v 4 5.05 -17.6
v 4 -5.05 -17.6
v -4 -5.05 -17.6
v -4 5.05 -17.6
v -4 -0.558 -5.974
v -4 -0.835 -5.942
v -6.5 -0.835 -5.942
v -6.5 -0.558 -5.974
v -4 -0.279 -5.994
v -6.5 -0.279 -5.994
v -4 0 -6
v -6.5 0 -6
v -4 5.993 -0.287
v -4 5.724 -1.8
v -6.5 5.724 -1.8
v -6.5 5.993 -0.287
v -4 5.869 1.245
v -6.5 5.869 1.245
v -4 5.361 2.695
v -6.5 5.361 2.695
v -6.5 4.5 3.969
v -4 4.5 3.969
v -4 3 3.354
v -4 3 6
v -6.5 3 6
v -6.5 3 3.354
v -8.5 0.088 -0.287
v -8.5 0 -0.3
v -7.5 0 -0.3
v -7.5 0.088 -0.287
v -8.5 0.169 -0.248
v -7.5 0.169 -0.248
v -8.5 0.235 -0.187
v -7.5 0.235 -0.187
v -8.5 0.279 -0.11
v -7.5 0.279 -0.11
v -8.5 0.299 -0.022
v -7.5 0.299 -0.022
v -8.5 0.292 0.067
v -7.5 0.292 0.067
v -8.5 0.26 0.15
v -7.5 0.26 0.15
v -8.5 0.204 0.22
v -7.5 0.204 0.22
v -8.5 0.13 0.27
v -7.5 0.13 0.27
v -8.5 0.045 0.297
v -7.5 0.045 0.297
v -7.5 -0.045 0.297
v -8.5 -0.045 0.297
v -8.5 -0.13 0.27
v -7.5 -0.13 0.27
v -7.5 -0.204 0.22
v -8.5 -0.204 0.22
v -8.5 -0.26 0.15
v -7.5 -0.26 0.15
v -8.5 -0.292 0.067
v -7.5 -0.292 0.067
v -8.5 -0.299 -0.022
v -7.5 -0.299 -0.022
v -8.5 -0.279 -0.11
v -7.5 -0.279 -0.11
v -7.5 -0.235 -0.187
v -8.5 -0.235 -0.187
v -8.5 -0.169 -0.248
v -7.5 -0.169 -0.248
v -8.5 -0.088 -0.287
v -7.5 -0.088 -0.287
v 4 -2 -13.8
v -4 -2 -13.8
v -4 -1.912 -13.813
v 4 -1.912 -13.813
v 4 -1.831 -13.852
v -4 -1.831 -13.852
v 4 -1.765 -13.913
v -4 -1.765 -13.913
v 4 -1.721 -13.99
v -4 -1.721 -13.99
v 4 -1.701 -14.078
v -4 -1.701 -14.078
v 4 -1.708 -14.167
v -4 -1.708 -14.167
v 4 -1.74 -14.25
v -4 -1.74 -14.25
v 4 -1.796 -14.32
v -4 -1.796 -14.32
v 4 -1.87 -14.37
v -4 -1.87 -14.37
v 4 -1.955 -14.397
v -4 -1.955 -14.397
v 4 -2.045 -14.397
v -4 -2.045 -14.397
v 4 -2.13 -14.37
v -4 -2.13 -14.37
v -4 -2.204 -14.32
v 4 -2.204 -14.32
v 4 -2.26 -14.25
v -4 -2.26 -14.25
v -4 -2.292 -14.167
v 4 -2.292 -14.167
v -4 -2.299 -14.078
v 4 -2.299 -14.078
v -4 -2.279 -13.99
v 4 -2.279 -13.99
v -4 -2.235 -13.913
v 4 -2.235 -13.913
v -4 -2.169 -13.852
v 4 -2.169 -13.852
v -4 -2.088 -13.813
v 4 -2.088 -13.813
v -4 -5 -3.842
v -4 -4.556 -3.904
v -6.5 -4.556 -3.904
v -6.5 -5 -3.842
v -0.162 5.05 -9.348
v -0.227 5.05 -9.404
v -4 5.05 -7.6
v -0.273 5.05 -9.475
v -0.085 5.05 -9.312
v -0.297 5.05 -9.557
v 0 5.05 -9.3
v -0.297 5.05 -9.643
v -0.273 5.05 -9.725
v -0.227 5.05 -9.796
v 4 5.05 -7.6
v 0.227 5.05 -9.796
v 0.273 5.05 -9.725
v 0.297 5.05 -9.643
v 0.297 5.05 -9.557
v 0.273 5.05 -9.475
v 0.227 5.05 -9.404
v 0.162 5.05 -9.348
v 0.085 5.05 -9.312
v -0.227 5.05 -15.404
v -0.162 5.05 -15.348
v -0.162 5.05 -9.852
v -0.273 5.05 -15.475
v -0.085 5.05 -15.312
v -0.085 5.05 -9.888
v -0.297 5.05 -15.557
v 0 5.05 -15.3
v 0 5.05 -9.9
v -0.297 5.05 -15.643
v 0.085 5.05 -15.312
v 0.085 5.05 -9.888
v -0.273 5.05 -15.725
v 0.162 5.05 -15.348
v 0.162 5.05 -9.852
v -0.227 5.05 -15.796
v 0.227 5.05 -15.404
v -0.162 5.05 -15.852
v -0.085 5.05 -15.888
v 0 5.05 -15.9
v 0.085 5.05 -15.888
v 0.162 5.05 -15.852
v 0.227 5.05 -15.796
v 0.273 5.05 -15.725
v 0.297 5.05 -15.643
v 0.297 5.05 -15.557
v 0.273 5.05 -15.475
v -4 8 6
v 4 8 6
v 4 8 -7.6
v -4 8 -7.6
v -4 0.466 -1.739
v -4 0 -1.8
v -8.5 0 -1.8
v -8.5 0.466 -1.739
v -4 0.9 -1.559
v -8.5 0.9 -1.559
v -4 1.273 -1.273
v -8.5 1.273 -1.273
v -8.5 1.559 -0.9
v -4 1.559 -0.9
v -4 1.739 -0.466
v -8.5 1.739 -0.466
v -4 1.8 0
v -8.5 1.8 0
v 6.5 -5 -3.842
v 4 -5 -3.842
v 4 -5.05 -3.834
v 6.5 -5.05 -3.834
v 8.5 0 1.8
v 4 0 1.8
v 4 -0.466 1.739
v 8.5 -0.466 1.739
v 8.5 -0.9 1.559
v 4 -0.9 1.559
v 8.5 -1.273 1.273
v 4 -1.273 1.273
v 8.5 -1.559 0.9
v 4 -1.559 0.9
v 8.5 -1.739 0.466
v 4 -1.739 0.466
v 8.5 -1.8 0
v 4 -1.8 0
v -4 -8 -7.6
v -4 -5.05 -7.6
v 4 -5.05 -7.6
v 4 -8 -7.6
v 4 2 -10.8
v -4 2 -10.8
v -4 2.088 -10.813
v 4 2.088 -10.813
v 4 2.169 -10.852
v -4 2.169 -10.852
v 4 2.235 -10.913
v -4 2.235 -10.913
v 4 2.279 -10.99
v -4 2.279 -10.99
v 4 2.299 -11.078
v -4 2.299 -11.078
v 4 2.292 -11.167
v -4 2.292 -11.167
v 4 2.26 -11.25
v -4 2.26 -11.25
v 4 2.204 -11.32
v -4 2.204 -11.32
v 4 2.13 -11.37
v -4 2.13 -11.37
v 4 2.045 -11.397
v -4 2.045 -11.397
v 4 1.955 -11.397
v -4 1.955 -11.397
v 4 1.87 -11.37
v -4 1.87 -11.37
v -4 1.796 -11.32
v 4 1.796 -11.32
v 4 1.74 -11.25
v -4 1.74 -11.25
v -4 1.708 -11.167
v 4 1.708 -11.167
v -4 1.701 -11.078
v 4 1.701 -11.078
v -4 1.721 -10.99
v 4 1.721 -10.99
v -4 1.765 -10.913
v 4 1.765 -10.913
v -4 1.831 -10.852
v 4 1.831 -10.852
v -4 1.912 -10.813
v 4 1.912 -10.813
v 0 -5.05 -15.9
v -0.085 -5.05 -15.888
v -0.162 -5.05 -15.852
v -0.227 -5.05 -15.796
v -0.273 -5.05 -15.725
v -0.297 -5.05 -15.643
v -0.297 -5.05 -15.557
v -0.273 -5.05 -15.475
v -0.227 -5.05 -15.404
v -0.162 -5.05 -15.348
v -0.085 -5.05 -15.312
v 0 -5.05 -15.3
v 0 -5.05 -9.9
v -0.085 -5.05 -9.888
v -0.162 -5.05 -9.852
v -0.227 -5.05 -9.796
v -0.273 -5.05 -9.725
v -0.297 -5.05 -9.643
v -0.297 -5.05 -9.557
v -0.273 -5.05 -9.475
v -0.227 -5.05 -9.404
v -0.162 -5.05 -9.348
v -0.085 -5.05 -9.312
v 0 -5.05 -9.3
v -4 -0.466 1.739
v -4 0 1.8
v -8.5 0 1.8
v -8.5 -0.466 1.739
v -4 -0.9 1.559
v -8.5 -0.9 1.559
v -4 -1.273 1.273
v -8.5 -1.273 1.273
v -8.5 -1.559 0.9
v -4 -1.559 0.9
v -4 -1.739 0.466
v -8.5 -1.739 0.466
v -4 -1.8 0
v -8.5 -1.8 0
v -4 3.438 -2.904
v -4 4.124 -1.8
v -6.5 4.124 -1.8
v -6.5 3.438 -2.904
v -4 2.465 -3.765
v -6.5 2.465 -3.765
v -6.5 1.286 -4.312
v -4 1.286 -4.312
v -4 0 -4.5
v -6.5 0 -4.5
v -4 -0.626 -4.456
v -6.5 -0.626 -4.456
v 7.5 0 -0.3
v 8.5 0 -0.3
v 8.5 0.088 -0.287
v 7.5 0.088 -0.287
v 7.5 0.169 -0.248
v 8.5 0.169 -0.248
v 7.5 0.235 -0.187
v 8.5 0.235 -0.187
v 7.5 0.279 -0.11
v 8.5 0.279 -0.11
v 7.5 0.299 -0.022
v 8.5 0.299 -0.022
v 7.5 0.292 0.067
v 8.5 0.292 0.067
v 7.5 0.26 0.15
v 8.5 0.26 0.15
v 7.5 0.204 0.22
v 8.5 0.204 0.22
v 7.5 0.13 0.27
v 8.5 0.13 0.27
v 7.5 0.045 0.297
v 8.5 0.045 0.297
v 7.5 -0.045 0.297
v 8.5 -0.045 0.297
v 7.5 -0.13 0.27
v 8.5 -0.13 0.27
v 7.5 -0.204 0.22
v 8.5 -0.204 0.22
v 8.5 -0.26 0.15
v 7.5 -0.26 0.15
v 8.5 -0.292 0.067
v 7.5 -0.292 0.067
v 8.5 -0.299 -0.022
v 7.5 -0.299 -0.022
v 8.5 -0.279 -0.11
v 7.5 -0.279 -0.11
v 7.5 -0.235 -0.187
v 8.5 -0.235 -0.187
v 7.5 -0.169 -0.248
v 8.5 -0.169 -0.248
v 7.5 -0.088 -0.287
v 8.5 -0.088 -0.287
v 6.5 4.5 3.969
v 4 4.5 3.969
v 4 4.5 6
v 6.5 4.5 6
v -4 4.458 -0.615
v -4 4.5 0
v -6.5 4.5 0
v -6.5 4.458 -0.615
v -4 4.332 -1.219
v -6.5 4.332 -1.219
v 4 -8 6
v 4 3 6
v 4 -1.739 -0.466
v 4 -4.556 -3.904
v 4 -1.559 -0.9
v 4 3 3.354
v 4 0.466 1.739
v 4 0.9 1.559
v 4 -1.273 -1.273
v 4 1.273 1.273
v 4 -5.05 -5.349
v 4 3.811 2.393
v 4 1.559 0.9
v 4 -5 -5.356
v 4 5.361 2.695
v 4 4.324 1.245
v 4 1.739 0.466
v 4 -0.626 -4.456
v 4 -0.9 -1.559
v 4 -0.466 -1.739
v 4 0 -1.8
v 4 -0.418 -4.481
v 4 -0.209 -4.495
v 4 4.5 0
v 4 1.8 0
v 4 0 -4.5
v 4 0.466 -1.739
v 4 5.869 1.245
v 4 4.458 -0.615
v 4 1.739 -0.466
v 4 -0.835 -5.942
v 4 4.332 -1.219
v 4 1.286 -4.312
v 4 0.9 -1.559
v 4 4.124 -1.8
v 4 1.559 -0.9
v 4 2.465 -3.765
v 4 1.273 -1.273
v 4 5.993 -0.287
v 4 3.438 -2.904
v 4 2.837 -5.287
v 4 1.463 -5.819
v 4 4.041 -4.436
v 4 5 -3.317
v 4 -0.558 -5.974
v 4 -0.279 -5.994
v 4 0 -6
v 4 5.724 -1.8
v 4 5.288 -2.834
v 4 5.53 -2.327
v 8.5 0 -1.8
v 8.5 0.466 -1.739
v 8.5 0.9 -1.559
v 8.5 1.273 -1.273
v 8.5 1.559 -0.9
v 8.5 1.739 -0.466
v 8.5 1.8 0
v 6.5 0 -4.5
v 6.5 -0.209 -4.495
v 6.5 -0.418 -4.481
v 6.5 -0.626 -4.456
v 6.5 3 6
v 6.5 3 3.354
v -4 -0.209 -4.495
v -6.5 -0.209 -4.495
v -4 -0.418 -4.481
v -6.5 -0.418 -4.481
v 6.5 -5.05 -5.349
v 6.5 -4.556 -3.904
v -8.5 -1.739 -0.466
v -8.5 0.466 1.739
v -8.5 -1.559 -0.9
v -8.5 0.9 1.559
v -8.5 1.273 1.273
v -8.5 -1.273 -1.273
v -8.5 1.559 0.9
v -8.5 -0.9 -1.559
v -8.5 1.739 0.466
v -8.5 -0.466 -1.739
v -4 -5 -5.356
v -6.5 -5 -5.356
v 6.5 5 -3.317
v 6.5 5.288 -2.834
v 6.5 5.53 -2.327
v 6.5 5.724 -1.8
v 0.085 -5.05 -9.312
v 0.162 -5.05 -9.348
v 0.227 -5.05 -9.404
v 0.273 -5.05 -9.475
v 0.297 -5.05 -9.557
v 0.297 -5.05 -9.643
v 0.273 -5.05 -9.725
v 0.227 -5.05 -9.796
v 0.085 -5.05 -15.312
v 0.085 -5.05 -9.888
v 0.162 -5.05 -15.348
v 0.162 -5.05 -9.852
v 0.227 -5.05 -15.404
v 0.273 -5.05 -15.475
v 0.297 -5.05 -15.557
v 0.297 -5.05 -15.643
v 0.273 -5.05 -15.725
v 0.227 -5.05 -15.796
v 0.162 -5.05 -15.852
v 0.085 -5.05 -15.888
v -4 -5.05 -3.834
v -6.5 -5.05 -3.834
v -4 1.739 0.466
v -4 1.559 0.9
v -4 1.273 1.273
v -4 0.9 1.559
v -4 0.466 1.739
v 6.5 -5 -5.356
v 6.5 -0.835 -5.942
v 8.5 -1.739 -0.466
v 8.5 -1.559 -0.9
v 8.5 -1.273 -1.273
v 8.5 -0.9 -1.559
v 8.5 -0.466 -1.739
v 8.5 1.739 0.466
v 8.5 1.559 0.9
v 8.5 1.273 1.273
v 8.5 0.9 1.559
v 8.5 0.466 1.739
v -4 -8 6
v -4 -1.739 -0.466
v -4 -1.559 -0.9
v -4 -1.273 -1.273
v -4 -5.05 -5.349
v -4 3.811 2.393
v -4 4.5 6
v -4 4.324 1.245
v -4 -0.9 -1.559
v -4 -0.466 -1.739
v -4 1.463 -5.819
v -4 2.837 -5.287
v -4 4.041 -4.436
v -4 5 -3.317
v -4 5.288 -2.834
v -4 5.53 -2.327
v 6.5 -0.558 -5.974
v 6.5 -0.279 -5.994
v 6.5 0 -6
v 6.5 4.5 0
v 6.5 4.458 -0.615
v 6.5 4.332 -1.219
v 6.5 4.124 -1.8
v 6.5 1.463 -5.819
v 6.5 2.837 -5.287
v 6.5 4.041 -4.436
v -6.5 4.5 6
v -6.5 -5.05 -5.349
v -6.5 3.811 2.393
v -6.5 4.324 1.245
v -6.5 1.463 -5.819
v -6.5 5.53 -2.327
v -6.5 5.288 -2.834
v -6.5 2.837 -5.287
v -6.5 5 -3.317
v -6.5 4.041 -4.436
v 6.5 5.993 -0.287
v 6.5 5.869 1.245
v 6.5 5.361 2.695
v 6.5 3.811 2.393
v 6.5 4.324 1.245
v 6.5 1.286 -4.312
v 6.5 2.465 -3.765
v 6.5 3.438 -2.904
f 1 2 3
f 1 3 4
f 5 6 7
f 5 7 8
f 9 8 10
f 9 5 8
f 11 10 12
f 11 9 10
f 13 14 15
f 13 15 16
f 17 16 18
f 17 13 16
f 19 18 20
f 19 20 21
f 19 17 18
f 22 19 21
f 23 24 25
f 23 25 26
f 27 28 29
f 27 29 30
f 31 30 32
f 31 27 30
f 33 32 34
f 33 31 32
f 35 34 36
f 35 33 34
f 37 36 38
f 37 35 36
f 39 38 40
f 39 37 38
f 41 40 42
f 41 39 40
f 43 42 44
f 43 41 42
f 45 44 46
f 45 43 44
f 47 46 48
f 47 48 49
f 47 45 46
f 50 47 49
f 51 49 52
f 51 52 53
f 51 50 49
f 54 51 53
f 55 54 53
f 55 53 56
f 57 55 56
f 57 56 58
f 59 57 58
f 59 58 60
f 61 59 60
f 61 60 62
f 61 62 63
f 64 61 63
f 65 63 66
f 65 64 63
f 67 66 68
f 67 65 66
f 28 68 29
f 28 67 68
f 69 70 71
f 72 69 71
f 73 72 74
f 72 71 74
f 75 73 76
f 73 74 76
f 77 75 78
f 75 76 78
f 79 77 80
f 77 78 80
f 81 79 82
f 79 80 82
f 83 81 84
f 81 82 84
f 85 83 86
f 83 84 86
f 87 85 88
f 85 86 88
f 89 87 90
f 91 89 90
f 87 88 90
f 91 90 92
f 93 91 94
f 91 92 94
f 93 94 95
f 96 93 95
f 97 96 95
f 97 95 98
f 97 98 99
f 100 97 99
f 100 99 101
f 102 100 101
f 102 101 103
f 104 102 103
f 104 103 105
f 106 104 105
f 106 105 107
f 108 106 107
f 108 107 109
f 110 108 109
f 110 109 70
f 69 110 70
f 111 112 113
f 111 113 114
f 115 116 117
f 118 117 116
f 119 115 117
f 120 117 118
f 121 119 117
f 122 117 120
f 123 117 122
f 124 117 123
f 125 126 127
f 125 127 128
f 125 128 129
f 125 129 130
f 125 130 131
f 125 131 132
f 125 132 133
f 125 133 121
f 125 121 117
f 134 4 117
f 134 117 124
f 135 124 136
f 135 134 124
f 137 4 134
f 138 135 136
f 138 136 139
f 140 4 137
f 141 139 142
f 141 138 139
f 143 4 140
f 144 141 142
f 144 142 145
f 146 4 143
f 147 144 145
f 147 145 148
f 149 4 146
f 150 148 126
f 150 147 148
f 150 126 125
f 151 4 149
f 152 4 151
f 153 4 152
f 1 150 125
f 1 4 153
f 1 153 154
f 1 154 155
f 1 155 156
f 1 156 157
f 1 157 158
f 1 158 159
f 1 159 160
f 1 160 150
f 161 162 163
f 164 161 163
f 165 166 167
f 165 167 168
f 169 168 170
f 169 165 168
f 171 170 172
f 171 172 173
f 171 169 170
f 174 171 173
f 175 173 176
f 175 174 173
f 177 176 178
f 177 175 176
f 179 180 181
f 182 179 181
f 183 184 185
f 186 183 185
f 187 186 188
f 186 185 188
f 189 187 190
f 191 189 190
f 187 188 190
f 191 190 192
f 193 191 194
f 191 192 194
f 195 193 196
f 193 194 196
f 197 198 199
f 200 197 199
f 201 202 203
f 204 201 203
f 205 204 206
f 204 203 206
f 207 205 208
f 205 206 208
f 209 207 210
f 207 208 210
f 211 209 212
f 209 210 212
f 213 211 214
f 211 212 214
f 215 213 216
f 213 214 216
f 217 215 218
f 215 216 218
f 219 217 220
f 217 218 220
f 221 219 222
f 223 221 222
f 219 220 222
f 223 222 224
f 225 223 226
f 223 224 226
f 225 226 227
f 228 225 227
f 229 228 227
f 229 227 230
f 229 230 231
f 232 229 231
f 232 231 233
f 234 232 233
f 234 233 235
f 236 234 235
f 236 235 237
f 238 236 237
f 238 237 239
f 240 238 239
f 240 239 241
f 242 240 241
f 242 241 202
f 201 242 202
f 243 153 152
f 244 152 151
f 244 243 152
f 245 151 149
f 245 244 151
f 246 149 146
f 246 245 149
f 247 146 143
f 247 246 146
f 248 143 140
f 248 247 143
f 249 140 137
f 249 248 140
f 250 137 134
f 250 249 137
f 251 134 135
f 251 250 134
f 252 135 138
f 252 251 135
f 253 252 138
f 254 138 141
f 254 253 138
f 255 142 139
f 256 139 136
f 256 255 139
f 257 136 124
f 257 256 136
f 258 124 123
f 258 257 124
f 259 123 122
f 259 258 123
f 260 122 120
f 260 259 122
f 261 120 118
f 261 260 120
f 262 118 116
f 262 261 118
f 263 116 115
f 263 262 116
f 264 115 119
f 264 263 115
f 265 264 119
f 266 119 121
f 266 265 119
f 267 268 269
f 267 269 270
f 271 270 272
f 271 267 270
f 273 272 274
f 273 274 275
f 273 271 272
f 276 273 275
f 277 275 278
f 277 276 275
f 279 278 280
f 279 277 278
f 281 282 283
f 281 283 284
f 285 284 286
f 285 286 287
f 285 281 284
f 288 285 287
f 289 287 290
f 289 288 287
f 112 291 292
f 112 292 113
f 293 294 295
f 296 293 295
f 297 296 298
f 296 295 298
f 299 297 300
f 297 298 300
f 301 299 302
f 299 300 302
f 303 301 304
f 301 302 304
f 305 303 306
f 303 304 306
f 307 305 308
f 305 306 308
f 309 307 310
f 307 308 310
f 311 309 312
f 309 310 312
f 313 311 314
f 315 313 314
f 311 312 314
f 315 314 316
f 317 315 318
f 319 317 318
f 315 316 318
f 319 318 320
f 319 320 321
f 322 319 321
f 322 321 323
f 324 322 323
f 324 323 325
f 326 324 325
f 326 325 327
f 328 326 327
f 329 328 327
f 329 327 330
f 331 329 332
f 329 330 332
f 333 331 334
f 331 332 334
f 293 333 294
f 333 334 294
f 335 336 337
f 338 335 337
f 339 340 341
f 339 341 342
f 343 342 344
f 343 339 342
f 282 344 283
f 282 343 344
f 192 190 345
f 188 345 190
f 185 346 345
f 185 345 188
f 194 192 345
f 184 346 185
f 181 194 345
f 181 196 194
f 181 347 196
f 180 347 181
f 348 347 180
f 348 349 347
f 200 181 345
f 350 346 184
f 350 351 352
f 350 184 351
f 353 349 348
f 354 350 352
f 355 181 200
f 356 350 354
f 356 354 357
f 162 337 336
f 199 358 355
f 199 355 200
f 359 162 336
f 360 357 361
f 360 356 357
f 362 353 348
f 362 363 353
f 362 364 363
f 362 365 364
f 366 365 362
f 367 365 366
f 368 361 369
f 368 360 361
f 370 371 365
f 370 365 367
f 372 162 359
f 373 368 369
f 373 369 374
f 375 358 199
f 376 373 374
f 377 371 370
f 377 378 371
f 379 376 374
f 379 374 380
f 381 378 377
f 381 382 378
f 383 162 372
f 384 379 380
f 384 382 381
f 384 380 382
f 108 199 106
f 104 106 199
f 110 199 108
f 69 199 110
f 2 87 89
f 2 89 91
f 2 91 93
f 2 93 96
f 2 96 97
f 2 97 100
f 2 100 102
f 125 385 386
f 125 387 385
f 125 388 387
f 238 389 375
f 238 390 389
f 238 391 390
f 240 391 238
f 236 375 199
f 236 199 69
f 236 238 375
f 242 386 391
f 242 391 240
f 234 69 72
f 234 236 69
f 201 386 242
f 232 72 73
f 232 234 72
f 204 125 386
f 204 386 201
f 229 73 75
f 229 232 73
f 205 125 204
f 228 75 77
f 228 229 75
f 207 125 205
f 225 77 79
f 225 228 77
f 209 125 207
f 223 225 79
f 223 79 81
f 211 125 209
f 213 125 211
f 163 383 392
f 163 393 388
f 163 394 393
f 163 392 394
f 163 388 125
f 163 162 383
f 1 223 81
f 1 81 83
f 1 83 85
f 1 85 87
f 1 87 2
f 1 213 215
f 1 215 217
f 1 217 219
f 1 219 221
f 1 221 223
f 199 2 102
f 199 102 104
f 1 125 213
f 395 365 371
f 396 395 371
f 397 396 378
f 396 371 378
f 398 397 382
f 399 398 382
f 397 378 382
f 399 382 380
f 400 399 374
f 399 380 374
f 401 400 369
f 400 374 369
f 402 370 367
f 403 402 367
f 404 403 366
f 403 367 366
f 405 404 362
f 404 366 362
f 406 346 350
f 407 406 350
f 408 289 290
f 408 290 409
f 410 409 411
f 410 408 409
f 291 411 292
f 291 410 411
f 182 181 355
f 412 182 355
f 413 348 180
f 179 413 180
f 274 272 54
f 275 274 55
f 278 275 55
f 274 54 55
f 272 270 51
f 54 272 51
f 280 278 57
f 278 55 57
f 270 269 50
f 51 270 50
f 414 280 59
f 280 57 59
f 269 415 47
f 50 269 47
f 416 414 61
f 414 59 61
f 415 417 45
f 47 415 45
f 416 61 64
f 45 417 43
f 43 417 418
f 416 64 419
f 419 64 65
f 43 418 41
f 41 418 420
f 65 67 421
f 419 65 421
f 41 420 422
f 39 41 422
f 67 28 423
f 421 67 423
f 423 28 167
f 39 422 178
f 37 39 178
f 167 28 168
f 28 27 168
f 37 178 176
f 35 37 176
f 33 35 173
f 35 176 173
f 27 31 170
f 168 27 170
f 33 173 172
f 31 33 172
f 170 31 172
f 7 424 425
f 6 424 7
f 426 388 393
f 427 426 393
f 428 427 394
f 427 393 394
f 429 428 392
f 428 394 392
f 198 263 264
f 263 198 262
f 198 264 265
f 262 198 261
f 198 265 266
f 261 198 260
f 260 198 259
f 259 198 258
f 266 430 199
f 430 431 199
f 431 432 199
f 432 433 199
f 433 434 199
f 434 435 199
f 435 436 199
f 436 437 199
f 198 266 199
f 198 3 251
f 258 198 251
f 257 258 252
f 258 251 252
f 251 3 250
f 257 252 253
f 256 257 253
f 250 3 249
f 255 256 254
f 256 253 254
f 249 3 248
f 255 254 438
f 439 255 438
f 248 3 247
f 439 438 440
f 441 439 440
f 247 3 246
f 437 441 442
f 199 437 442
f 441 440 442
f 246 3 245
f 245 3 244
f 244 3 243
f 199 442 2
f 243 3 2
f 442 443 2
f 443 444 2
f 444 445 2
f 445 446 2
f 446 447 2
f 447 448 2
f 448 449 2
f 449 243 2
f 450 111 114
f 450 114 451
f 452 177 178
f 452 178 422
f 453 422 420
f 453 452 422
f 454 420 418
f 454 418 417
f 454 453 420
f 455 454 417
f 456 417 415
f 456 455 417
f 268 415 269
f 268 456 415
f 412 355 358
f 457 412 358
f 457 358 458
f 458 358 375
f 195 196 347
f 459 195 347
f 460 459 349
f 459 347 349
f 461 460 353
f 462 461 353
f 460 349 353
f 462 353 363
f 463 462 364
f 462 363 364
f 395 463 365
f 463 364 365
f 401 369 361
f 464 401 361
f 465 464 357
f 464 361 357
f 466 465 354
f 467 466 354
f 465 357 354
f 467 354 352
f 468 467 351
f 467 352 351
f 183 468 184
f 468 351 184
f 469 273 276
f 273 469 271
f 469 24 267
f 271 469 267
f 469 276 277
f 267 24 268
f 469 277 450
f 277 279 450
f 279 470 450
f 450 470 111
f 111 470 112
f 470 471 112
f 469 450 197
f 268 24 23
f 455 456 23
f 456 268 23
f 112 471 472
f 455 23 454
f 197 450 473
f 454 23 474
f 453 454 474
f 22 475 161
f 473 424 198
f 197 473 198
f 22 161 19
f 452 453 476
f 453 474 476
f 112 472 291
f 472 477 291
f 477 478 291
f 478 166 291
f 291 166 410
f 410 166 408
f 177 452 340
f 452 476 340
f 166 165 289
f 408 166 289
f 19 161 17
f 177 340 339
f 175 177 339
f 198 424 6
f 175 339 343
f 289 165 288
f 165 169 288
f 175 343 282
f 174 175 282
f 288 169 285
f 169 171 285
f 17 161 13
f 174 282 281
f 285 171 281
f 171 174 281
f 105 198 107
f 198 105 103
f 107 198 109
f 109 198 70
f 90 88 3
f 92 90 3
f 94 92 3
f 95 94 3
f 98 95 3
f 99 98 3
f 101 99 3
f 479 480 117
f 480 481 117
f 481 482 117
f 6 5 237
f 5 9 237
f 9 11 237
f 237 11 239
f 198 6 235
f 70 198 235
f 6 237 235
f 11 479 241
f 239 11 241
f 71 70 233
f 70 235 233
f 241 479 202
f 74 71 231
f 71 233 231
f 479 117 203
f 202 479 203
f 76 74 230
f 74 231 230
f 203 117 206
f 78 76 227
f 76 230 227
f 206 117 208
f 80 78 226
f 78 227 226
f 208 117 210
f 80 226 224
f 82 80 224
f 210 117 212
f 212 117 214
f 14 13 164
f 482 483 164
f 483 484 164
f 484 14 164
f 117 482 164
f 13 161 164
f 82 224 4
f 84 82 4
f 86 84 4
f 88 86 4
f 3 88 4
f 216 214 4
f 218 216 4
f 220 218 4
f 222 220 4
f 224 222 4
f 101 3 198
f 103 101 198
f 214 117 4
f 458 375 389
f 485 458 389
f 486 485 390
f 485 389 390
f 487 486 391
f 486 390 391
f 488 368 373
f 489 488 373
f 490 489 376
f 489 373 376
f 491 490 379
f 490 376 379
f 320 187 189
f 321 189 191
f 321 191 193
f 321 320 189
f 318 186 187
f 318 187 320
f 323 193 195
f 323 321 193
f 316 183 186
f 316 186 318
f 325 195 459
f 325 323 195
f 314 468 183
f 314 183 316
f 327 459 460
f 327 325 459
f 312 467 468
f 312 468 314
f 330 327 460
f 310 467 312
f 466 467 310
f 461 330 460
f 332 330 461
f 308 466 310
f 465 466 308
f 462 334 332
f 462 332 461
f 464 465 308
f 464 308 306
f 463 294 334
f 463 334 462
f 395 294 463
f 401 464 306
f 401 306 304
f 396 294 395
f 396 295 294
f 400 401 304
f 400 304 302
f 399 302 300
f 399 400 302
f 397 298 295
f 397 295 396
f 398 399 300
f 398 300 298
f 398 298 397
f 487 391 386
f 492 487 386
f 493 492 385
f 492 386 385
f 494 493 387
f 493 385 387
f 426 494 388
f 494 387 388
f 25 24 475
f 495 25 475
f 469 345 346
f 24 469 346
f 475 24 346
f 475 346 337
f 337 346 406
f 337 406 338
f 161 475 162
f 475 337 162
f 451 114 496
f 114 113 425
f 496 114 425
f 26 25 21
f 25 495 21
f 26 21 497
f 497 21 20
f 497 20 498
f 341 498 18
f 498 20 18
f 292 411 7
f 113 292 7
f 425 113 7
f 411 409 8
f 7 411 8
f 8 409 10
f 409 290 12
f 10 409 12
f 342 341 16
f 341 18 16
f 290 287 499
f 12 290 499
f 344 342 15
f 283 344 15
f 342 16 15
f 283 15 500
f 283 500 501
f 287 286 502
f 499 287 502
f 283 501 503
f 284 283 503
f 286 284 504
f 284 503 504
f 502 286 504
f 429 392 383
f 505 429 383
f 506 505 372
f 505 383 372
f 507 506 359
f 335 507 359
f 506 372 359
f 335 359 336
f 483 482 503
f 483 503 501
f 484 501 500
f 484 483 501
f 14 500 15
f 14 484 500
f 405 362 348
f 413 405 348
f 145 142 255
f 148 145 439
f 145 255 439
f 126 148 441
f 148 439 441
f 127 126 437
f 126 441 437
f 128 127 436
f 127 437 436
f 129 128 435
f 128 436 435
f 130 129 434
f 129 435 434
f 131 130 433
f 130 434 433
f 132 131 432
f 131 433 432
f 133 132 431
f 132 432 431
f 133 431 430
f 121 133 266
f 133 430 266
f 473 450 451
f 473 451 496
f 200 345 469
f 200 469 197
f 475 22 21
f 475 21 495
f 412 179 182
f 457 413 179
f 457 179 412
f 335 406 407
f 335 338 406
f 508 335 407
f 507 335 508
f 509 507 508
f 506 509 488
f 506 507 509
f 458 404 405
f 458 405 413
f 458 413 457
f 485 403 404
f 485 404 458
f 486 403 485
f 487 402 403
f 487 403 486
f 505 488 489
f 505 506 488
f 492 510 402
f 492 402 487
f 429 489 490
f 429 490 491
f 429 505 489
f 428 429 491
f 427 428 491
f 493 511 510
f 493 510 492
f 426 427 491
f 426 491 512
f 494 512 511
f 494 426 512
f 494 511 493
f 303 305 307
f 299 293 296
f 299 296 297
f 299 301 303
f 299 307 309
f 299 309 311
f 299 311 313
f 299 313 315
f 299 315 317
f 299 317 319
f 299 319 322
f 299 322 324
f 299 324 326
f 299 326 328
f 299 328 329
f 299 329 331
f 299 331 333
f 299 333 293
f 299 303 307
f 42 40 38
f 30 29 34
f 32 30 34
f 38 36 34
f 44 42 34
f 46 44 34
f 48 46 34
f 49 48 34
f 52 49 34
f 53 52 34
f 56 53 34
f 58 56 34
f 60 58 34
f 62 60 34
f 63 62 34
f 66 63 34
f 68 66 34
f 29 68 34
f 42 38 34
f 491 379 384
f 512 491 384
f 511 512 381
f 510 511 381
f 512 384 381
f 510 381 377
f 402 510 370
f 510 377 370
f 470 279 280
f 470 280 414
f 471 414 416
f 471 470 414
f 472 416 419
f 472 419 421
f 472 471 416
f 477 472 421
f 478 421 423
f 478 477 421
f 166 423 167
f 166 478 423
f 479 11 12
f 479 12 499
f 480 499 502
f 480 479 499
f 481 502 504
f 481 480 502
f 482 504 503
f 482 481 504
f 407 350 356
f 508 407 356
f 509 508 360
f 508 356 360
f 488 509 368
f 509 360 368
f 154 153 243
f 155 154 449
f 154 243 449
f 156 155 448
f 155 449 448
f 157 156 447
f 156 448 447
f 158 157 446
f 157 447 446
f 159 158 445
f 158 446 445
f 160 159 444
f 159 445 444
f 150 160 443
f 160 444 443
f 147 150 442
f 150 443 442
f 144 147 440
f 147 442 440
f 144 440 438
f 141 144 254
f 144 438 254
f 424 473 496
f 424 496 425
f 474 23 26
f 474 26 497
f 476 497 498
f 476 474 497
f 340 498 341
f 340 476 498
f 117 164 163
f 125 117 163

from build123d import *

# Parameters (mm, degrees)
SKETCH_2_W           = 23.6
SKETCH_2_H           = 16
EXTRUDE_1_DEPTH      = 4
EXTRUDE_START        = 4
EXTRUDE_3_DEPTH      = 4.5
SKETCH_5_R           = 0.3
CUT_EXTRUDE_10_DEPTH = 1
EXTRUDE_2_DEPTH      = 2.5
SKETCH_6_W           = 4
SKETCH_6_H           = 2.95
CUT_EXTRUDE_11_DEPTH = 10
SKETCH_7_R           = 0.3
CUT_EXTRUDE_12_DEPTH = 24.50132975
SKETCH_8_W           = 13.6
SKETCH_8_H           = 2.95
CUT_EXTRUDE_13_DEPTH = 2.5
CUT_EXTRUDE_14_REACH = 25.022
SKETCH_9_R           = 0.3


with BuildPart() as part:
    # 草图2 → 凸台-拉伸1 (new body)
    with BuildSketch(Plane(origin=(0, 0, 0), x_dir=(0, 0, -1), z_dir=(1, 0, 0))):
        with Locations((5.8, 0)):
            Rectangle(SKETCH_2_W, SKETCH_2_H)
    extrude(amount=EXTRUDE_1_DEPTH)

    # 草图2<10> → 凸台-拉伸3 (add)
    with BuildSketch(Plane(origin=(0, 0, 0), x_dir=(0, 0, -1), z_dir=(1, 0, 0)).offset(EXTRUDE_START)):
        with BuildLine():
            ThreePointArc((0, -1.8), (1.272792206, -1.272792206), (1.8, 0))
            Line((1.8, 0), (0, 0))
            Line((0, 0), (0, -1.8))
        make_face()
        with BuildLine():
            Line((0, 0), (1.8, 0))
            ThreePointArc((1.8, 0), (1.272792206, 1.272792206), (0, 1.8))
            Line((0, 1.8), (0, 0))
        make_face()
        with BuildLine():
            Line((0, -1.8), (0, 0))
            Line((0, 0), (-1.8, 0))
            ThreePointArc((-1.8, 0), (-1.272792206, -1.272792206), (0, -1.8))
        make_face()
        with BuildLine():
            Line((-1.8, 0), (0, 0))
            Line((0, 0), (0, 1.8))
            ThreePointArc((0, 1.8), (-1.272792206, 1.272792206), (-1.8, 0))
        make_face()
    extrude(amount=EXTRUDE_3_DEPTH)

    # 草图5 → 切除-拉伸10 (cut)
    with BuildSketch(Plane(origin=(8.5, 0, 0), x_dir=(0, 0, -1), z_dir=(1, 0, 0))):
        Circle(SKETCH_5_R)
    extrude(amount=-CUT_EXTRUDE_10_DEPTH, mode=Mode.SUBTRACT)

    # 草图2<4> → 凸台-拉伸2 (add)
    with BuildSketch(Plane(origin=(0, 0, 0), x_dir=(0, 0, -1), z_dir=(1, 0, 0)).offset(EXTRUDE_START)):
        with BuildLine():
            ThreePointArc((-3.354101966, 3), (-1.837117307, 4.107919181), (0, 4.5))
            Line((0, 4.5), (-3.968626967, 4.5))
            ThreePointArc((-3.968626967, 4.5), (-4.643360347, 3.799895352), (-5.196152423, 3))
            Line((-5.196152423, 3), (-3.354101966, 3))
        make_face()
        with BuildLine():
            Line((0, 5), (1.8, 5))
            Line((1.8, 5), (1.8, 5.723635209))
            ThreePointArc((1.8, 5.723635209), (-1.245012655, 5.869407422), (-3.968626967, 4.5))
            Line((-3.968626967, 4.5), (0, 4.5))
            Line((0, 4.5), (0, 5))
        make_face()
        with BuildLine():
            ThreePointArc((0, 4.5), (0.919393397, 4.405078408), (1.8, 4.124318125))
            Line((1.8, 4.124318125), (1.8, 5))
            Line((1.8, 5), (0, 5))
            Line((0, 5), (0, 4.5))
        make_face()
        with BuildLine():
            ThreePointArc((1.8, 4.124318125), (3.764970119, 2.464751509), (4.5, 0))
            Line((4.5, 0), (6, 0))
            ThreePointArc((6, 0), (5.286764074, 2.837274331), (3.31662479, 5))
            Line((3.31662479, 5), (1.8, 5))
            Line((1.8, 5), (1.8, 4.124318125))
        make_face()
        with BuildLine():
            Line((1.8, 5.723635209), (1.8, 5))
            Line((1.8, 5), (3.31662479, 5))
            ThreePointArc((3.31662479, 5), (2.583771331, 5.415175501), (1.8, 5.723635209))
        make_face()
        with BuildLine():
            Line((6, 0), (4.5, 0))
            ThreePointArc((4.5, 0), (4.489038226, -0.313904132), (4.456206309, -0.626278954))
            Line((4.456206309, -0.626278954), (3.903880188, -4.556283516))
            ThreePointArc((3.903880188, -4.556283516), (5.262635021, -2.881782892), (5.941608412, -0.835038606))
            ThreePointArc((5.941608412, -0.835038606), (5.985384302, -0.418538842), (6, 0))
        make_face()
        with BuildLine():
            Line((5.356261262, -5), (5.941608412, -0.835038606))
            ThreePointArc((5.941608412, -0.835038606), (5.262635021, -2.881782892), (3.903880188, -4.556283516))
            Line((3.903880188, -4.556283516), (3.841519903, -5))
            Line((3.841519903, -5), (5.356261262, -5))
        make_face()
        Polygon((4.934638757, -8), (5.356261262, -5), (3.841519903, -5), (3.419897399, -8), align=None)
        with BuildLine():
            ThreePointArc((-5.196152423, 3), (-4.643360347, 3.799895352), (-3.968626967, 4.5))
            Line((-3.968626967, 4.5), (-6, 4.5))
            Line((-6, 4.5), (-6, 3))
            Line((-6, 3), (-5.196152423, 3))
        make_face()
    extrude(amount=EXTRUDE_2_DEPTH)

    # 草图6 → 切除-拉伸11 (cut)
    with BuildSketch(Plane(origin=(0, 0, -17.6), x_dir=(-1, 0, 0), z_dir=(0, 0, -1))):
        with Locations((-2, 6.525)):
            Rectangle(SKETCH_6_W, SKETCH_6_H)
        with Locations((-2, -6.525)):
            Rectangle(SKETCH_6_W, SKETCH_6_H)
    extrude(amount=-CUT_EXTRUDE_11_DEPTH, mode=Mode.SUBTRACT)

    # 草图7 → 切除-拉伸12 (cut, through all)
    with BuildSketch(Plane.XZ.offset(5.05)):
        with Locations((0, -9.6)):
            Circle(SKETCH_7_R)
        with Locations((0, -15.6)):
            Circle(SKETCH_7_R)
    extrude(amount=-CUT_EXTRUDE_12_DEPTH, mode=Mode.SUBTRACT)

    # 草图8 → 切除-拉伸13 (cut)
    with BuildSketch(Plane(origin=(6.5, 0, 0), x_dir=(0, 0, -1), z_dir=(1, 0, 0))):
        with Locations((0.8, -6.525)):
            Rectangle(SKETCH_8_W, SKETCH_8_H)
    extrude(amount=-CUT_EXTRUDE_13_DEPTH, mode=Mode.SUBTRACT)

    # 镜向1: part across plane


with BuildPart() as part_1:
    add(part.part)
    add(part.part.mirror(Plane(origin=(0, 0, 0), x_dir=(0, 0, 1), z_dir=(1, 0, 0))))

    # 草图9 → 切除-拉伸14 (cut, up to next)
    with BuildSketch(Plane.ZY.offset(4), mode=Mode.PRIVATE) as cut_extrude_14_sk1:
        with Locations((-14.1, -2)):
            Circle(SKETCH_9_R)
    cut_extrude_14_tool1 = extrude(cut_extrude_14_sk1.sketch, amount=-CUT_EXTRUDE_14_REACH, mode=Mode.PRIVATE) & part_1.part
    # 草图9 → 切除-拉伸14 (cut, up to next)
    with BuildSketch(Plane.ZY.offset(4), mode=Mode.PRIVATE) as cut_extrude_14_sk2:
        with Locations((-11.1, 2)):
            Circle(SKETCH_9_R)
    cut_extrude_14_tool2 = extrude(cut_extrude_14_sk2.sketch, amount=-CUT_EXTRUDE_14_REACH, mode=Mode.PRIVATE) & part_1.part
    add(cut_extrude_14_tool1.solids().sort_by_distance((-4, -2, -14.1))[0], mode=Mode.SUBTRACT)
    add(cut_extrude_14_tool2.solids().sort_by_distance((-4, 2, -11.1))[0], mode=Mode.SUBTRACT)


solid = part_1.part
